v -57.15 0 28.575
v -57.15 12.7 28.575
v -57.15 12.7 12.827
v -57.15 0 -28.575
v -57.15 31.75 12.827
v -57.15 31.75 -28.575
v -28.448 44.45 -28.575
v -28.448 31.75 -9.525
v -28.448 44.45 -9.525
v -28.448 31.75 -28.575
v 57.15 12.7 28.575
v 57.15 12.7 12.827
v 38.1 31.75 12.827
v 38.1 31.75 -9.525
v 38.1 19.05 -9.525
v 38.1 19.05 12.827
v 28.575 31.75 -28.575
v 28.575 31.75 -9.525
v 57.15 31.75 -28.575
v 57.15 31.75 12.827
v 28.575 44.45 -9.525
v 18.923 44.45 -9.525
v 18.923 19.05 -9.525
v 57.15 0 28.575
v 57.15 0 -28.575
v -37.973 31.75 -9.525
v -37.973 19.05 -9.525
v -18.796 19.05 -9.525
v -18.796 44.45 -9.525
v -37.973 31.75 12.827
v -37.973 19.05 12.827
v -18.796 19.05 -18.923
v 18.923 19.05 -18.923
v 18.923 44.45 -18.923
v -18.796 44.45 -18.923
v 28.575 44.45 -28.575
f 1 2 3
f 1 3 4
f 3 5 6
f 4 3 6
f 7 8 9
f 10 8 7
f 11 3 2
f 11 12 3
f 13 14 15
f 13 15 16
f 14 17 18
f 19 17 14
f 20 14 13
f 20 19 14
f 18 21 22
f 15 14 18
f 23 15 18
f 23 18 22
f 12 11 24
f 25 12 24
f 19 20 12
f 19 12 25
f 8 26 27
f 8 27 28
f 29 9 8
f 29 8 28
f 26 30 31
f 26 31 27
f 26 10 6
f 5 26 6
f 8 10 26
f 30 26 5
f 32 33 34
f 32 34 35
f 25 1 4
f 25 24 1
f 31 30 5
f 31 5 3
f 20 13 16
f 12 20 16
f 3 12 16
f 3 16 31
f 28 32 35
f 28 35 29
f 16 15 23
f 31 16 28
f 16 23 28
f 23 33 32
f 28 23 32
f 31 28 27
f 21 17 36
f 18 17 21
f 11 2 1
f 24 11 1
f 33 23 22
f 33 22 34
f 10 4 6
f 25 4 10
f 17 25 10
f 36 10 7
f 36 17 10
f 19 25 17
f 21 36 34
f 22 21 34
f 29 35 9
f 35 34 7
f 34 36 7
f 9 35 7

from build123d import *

# Parameters (mm, degrees)
BOSS_EXTRUDE1_DEPTH = 57.15
BOSS_EXTRUDE2_DEPTH = 12.7
CUT_EXTRUDE1_DEPTH  = 25.4


with BuildPart() as part:
    # Sketch1 → Boss-Extrude1 (new, symmetric)
    with BuildSketch(Plane(origin=(0, 0, 0), x_dir=(0, 0, -1), z_dir=(1, 0, 0))):
        Polygon((-28.575, 0), (28.575, 0), (28.575, 31.75), (-12.827, 31.75), (-12.827, 12.7), (-28.575, 12.7), align=None)
    extrude(amount=BOSS_EXTRUDE1_DEPTH, both=True)

    # Sketch2 → Boss-Extrude2 (add)
    with BuildSketch(Plane(origin=(0, 31.75, 0), x_dir=(1, 0, 0), z_dir=(0, 1, 0))):
        Polygon((-28.448, 28.575), (28.575, 28.575), (28.575, 9.525), (18.923, 9.525), (18.923, 18.923), (-18.796, 18.923), (-18.796, 9.525), (-28.448, 9.525), align=None)
    extrude(amount=BOSS_EXTRUDE2_DEPTH)

    # Sketch3 → Cut-Extrude1 (cut)
    with BuildSketch(Plane(origin=(0, 44.45, 0), x_dir=(1, 0, 0), z_dir=(0, 1, 0))):
        Polygon((-18.796, 9.525), (-18.796, 18.923), (18.923, 18.923), (18.923, 9.525), (38.1, 9.525), (38.1, -12.827), (-37.973, -12.827), (-37.973, 9.525), align=None)
    extrude(amount=-CUT_EXTRUDE1_DEPTH, mode=Mode.SUBTRACT)


solid = part.part
